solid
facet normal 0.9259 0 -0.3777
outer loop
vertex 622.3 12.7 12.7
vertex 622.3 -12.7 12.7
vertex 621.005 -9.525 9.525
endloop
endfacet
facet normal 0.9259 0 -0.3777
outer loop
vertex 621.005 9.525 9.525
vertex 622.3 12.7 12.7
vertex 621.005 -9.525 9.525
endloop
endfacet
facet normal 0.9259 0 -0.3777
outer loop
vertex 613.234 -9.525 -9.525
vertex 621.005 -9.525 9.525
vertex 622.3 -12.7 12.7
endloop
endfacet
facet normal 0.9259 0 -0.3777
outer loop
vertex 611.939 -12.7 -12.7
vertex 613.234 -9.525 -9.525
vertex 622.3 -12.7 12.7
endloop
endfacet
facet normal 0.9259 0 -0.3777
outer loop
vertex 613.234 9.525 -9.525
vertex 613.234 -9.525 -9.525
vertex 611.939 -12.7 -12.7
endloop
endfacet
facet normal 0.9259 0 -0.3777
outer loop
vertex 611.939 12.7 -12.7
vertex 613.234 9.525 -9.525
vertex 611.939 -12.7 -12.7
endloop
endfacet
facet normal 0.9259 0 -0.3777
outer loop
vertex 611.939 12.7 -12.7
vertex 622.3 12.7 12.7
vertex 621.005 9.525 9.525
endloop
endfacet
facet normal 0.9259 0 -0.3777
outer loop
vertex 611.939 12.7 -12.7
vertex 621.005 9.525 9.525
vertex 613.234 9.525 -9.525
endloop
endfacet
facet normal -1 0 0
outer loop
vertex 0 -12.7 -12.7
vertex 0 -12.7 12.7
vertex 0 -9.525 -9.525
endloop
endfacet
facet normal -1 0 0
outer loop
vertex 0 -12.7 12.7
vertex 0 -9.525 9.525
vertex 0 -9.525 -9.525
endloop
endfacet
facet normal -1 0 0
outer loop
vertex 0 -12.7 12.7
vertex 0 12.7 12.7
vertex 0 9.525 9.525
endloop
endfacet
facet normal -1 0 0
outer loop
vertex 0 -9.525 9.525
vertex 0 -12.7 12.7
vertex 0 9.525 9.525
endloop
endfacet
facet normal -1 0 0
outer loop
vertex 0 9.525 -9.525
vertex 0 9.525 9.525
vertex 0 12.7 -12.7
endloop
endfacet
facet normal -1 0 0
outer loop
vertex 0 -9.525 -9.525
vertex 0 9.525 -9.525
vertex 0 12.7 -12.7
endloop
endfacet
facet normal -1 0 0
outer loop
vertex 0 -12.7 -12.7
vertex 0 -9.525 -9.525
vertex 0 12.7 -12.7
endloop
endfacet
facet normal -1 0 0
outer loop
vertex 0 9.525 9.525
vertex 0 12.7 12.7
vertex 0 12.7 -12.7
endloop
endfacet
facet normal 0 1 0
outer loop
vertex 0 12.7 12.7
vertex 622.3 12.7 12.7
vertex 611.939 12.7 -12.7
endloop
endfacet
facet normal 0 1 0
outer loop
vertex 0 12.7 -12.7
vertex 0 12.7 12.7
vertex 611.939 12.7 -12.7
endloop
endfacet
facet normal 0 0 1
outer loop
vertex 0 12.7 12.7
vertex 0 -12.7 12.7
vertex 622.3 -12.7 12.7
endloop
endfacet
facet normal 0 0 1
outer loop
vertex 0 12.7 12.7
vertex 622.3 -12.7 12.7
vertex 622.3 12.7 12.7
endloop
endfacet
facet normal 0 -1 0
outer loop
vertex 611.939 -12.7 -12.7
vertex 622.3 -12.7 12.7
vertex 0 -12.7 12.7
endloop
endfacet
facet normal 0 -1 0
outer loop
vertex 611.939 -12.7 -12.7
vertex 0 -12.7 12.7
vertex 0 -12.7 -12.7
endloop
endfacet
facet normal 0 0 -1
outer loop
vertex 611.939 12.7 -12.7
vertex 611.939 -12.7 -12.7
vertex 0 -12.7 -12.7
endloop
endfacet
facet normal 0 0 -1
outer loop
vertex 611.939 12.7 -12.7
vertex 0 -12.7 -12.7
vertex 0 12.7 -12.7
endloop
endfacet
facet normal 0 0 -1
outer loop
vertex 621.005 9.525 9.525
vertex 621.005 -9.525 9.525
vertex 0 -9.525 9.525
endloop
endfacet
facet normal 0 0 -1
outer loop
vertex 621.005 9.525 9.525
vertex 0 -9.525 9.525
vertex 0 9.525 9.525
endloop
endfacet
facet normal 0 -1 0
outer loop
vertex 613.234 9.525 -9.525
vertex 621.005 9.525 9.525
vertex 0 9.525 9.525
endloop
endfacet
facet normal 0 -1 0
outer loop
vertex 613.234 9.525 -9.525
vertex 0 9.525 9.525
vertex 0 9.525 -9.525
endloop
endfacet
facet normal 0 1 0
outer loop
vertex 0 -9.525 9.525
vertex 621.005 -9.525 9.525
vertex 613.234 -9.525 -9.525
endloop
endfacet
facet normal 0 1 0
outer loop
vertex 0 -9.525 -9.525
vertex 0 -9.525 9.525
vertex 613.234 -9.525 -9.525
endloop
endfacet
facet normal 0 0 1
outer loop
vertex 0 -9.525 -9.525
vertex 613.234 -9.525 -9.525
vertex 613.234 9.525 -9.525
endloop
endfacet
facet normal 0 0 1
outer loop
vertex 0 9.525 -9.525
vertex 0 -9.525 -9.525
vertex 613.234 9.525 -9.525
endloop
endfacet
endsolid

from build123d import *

# Parameters (mm, degrees)
SKETCH2_W           = 25.4
SKETCH2_H           = 25.4
SKETCH2_W_2         = 19.05
SKETCH2_H_2         = 19.05
BOSS_EXTRUDE1_DEPTH = 622.3
CUT_EXTRUDE1_REACH  = 624.948


with BuildPart() as part:
    # Sketch2 → Boss-Extrude1 (new body)
    with BuildSketch(Plane(origin=(0, 0, 0), x_dir=(0, 0, -1), z_dir=(1, 0, 0))):
        Rectangle(SKETCH2_W, SKETCH2_H)
        Rectangle(SKETCH2_W_2, SKETCH2_H_2, mode=Mode.SUBTRACT)
    extrude(amount=BOSS_EXTRUDE1_DEPTH)

    # Cut-Extrude1: up to this face of the body (flat: up to its plane)
    cut_extrude1_end = Plane(part.part.faces().sort_by_distance((311.15, -12.7, 0))[0])
    # Sketch3 → Cut-Extrude1 (cut, up to the picked face)
    with BuildSketch(Plane(origin=(0, 12.7, 0), x_dir=(1, 0, 0), z_dir=(0, 1, 0)), mode=Mode.PRIVATE) as cut_extrude1_sk1:
        Polygon((622.3, -12.7), (611.938792348, 12.7), (622.3, 12.7), align=None)
    cut_extrude1_tool1 = split(extrude(cut_extrude1_sk1.sketch, amount=-CUT_EXTRUDE1_REACH, mode=Mode.PRIVATE), bisect_by=cut_extrude1_end, keep=Keep.BOTH, mode=Mode.PRIVATE)
    add(cut_extrude1_tool1.solids().sort_by(Axis((618.846264, 12.7, -4.233333), (0, -1, 0)))[0], mode=Mode.SUBTRACT)


solid = part.part
